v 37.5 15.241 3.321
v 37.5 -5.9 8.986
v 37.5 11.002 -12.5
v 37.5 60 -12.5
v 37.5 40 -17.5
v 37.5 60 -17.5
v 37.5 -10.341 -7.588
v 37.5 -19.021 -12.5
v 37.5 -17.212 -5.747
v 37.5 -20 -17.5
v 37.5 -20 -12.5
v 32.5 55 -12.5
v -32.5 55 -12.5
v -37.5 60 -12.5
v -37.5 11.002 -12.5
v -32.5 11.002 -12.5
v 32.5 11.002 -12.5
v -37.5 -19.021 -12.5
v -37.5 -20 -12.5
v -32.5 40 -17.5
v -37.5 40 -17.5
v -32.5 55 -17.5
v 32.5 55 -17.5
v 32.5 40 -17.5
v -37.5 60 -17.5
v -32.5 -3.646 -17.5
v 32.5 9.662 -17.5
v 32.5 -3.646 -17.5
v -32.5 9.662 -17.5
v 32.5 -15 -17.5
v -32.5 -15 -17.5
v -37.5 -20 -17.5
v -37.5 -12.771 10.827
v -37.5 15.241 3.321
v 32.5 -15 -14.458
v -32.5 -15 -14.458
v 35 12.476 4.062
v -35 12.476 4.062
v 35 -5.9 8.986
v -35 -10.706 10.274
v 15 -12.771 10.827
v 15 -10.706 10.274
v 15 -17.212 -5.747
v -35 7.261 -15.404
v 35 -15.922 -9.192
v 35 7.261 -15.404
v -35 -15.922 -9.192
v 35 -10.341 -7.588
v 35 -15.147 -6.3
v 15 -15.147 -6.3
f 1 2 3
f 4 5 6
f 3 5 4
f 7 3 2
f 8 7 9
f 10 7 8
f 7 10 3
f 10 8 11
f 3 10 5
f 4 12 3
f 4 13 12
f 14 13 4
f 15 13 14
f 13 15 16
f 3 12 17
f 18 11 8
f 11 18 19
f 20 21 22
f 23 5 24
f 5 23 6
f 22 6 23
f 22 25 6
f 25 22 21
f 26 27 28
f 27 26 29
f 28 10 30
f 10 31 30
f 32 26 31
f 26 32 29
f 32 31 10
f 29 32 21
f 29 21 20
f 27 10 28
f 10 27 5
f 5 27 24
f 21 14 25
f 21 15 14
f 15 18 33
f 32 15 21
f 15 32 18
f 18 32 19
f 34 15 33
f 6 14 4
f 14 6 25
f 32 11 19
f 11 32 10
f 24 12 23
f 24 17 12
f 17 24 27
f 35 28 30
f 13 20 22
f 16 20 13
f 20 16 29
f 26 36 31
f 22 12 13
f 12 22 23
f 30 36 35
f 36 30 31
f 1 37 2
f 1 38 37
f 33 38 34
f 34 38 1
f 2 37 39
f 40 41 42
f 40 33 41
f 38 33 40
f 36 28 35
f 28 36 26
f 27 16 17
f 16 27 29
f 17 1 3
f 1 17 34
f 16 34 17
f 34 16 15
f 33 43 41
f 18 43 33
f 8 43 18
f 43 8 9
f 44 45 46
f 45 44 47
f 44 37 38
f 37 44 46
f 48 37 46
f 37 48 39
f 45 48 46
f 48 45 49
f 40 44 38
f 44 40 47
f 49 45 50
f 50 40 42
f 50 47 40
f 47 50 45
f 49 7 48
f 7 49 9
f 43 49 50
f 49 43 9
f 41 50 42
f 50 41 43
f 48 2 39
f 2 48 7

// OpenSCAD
multimeter_width = 70;
multimeter_height = 24;
holder_height = 25;
border_width = 5;
angle = 15;

platform_length = 80;
platform_offset = [0, 20, -15];


difference(){
    union(){
        difference(){
        union(){
            //holder box
            translate([0, -2, -5])
            rotate([-angle, 0, 0])
            cube([multimeter_width+border_width, multimeter_height+border_width, holder_height], center=true);

            // platform
            translate(platform_offset)
            difference(){
            cube([multimeter_width+border_width, platform_length, border_width], center=true);
            cube([multimeter_width-border_width, platform_length-2*border_width, border_width], center=true);
            }
        };
        //multimeter hole
        rotate([-angle, 0, 0])
        translate([0, -1, 0])
        cube([multimeter_width, multimeter_height, holder_height+1], center=true);
        }
    }

// this structure removes the bottommost residue from the rotation
color("red")
translate([0,0,-4*border_width])
    cube([multimeter_width+border_width, platform_length, border_width], center=true);
// this is a cutout for the connectors
color("cyan")
translate([15, -20, -5])
rotate([-angle, 0, 0])
cube([23, border_width*2, 20]);
}
